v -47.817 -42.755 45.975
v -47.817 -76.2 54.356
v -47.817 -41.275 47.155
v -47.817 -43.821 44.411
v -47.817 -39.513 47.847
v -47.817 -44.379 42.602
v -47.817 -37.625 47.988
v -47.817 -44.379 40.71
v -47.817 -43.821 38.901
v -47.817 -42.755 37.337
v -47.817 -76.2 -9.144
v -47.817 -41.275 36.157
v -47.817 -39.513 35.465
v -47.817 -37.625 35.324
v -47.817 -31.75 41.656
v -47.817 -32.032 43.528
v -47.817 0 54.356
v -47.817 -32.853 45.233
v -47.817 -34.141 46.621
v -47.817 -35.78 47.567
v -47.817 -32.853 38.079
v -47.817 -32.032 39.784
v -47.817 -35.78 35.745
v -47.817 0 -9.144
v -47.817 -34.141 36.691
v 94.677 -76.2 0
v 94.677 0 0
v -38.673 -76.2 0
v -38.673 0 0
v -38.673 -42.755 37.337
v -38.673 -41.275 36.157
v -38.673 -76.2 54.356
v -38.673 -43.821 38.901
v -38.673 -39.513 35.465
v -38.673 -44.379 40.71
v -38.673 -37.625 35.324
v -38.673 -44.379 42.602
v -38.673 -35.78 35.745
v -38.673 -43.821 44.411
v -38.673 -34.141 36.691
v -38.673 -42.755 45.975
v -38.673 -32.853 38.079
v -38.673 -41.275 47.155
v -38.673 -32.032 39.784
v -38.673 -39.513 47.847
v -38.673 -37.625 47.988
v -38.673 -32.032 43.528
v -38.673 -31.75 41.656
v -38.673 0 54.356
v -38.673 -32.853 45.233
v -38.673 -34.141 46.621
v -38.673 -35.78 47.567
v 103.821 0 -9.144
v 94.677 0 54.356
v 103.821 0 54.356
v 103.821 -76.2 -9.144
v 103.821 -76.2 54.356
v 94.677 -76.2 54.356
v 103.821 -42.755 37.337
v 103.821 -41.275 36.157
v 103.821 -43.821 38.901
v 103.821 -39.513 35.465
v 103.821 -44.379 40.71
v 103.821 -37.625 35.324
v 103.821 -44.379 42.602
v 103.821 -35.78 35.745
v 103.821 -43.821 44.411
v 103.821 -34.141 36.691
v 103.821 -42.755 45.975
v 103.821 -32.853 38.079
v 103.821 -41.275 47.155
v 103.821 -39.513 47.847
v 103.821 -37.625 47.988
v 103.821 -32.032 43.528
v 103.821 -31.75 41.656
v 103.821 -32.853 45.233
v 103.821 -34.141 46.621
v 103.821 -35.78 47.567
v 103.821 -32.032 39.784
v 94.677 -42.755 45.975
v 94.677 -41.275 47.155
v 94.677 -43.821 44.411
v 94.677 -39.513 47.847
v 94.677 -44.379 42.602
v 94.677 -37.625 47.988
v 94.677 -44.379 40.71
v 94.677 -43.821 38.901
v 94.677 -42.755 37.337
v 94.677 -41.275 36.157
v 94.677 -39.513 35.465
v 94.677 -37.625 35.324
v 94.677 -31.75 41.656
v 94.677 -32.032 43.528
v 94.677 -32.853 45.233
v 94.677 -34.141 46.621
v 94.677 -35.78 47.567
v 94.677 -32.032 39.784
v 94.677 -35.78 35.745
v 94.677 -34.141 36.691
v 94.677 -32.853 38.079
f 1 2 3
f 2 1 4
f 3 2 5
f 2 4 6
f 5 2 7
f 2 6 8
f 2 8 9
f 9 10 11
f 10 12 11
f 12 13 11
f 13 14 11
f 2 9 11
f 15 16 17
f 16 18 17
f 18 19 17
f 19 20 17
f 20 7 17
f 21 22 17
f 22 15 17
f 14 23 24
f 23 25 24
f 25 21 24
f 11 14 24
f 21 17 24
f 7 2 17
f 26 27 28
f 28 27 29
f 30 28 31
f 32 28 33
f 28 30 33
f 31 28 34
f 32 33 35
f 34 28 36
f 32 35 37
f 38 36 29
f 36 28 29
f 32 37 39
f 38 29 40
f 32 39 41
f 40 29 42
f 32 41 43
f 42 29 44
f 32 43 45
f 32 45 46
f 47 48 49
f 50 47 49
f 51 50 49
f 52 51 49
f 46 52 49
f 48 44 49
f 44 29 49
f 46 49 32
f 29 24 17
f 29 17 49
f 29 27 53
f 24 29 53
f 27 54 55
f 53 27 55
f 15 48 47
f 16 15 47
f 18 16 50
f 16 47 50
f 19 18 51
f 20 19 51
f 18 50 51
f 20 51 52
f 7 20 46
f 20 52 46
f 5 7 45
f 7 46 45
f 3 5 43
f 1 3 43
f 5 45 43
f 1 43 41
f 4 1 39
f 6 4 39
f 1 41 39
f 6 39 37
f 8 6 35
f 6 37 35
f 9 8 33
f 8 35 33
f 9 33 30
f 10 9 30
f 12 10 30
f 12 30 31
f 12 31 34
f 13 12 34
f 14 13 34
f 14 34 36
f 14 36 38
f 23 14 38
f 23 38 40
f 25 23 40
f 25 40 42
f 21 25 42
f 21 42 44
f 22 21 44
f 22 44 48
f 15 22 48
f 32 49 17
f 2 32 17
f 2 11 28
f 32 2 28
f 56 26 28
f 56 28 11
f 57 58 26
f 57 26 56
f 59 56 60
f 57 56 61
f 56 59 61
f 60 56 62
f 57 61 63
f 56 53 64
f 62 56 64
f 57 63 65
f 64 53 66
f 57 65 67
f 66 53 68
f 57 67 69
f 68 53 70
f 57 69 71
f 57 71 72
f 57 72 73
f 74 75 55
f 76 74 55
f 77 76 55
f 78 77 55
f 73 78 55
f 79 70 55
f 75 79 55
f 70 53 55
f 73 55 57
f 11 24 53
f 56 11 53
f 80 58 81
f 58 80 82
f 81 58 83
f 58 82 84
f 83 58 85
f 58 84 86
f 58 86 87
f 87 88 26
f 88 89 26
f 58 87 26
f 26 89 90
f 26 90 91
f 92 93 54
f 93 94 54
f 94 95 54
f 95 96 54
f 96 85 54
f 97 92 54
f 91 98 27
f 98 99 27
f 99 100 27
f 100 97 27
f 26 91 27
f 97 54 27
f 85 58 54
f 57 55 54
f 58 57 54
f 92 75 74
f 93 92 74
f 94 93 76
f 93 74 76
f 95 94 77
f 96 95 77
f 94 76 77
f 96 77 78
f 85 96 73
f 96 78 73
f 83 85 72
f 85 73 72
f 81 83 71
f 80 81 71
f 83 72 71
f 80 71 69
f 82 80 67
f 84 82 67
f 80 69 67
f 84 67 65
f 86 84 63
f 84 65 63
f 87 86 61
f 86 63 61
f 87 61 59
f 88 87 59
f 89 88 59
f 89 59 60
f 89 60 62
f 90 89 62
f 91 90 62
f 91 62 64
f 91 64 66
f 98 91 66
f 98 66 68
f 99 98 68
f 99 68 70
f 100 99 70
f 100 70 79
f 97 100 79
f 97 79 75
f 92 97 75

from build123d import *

# Parameters (mm, degrees)
F1_DEPTH = 76.2
F2_R     = 6.35
F3_DEPTH = 151.639


with BuildPart() as f1:
    # F0 (on Front) → F1 (new body)
    with BuildSketch(Plane.XZ):
        Polygon((94.677072, 0), (-38.672928, 0), (-38.672928, 54.356), (-47.816928, 54.356), (-47.816928, -9.144), (103.821072, -9.144), (103.821072, 54.356), (94.677072, 54.356), align=None)
    extrude(amount=F1_DEPTH)

    # F2 (on face) → F3 (cut, through all)
    with BuildSketch(Plane.YZ.offset(103.821072)):
        with Locations((-38.1, 41.656)):
            Circle(F2_R)
    extrude(amount=-F3_DEPTH, mode=Mode.SUBTRACT)


solid = f1.part
